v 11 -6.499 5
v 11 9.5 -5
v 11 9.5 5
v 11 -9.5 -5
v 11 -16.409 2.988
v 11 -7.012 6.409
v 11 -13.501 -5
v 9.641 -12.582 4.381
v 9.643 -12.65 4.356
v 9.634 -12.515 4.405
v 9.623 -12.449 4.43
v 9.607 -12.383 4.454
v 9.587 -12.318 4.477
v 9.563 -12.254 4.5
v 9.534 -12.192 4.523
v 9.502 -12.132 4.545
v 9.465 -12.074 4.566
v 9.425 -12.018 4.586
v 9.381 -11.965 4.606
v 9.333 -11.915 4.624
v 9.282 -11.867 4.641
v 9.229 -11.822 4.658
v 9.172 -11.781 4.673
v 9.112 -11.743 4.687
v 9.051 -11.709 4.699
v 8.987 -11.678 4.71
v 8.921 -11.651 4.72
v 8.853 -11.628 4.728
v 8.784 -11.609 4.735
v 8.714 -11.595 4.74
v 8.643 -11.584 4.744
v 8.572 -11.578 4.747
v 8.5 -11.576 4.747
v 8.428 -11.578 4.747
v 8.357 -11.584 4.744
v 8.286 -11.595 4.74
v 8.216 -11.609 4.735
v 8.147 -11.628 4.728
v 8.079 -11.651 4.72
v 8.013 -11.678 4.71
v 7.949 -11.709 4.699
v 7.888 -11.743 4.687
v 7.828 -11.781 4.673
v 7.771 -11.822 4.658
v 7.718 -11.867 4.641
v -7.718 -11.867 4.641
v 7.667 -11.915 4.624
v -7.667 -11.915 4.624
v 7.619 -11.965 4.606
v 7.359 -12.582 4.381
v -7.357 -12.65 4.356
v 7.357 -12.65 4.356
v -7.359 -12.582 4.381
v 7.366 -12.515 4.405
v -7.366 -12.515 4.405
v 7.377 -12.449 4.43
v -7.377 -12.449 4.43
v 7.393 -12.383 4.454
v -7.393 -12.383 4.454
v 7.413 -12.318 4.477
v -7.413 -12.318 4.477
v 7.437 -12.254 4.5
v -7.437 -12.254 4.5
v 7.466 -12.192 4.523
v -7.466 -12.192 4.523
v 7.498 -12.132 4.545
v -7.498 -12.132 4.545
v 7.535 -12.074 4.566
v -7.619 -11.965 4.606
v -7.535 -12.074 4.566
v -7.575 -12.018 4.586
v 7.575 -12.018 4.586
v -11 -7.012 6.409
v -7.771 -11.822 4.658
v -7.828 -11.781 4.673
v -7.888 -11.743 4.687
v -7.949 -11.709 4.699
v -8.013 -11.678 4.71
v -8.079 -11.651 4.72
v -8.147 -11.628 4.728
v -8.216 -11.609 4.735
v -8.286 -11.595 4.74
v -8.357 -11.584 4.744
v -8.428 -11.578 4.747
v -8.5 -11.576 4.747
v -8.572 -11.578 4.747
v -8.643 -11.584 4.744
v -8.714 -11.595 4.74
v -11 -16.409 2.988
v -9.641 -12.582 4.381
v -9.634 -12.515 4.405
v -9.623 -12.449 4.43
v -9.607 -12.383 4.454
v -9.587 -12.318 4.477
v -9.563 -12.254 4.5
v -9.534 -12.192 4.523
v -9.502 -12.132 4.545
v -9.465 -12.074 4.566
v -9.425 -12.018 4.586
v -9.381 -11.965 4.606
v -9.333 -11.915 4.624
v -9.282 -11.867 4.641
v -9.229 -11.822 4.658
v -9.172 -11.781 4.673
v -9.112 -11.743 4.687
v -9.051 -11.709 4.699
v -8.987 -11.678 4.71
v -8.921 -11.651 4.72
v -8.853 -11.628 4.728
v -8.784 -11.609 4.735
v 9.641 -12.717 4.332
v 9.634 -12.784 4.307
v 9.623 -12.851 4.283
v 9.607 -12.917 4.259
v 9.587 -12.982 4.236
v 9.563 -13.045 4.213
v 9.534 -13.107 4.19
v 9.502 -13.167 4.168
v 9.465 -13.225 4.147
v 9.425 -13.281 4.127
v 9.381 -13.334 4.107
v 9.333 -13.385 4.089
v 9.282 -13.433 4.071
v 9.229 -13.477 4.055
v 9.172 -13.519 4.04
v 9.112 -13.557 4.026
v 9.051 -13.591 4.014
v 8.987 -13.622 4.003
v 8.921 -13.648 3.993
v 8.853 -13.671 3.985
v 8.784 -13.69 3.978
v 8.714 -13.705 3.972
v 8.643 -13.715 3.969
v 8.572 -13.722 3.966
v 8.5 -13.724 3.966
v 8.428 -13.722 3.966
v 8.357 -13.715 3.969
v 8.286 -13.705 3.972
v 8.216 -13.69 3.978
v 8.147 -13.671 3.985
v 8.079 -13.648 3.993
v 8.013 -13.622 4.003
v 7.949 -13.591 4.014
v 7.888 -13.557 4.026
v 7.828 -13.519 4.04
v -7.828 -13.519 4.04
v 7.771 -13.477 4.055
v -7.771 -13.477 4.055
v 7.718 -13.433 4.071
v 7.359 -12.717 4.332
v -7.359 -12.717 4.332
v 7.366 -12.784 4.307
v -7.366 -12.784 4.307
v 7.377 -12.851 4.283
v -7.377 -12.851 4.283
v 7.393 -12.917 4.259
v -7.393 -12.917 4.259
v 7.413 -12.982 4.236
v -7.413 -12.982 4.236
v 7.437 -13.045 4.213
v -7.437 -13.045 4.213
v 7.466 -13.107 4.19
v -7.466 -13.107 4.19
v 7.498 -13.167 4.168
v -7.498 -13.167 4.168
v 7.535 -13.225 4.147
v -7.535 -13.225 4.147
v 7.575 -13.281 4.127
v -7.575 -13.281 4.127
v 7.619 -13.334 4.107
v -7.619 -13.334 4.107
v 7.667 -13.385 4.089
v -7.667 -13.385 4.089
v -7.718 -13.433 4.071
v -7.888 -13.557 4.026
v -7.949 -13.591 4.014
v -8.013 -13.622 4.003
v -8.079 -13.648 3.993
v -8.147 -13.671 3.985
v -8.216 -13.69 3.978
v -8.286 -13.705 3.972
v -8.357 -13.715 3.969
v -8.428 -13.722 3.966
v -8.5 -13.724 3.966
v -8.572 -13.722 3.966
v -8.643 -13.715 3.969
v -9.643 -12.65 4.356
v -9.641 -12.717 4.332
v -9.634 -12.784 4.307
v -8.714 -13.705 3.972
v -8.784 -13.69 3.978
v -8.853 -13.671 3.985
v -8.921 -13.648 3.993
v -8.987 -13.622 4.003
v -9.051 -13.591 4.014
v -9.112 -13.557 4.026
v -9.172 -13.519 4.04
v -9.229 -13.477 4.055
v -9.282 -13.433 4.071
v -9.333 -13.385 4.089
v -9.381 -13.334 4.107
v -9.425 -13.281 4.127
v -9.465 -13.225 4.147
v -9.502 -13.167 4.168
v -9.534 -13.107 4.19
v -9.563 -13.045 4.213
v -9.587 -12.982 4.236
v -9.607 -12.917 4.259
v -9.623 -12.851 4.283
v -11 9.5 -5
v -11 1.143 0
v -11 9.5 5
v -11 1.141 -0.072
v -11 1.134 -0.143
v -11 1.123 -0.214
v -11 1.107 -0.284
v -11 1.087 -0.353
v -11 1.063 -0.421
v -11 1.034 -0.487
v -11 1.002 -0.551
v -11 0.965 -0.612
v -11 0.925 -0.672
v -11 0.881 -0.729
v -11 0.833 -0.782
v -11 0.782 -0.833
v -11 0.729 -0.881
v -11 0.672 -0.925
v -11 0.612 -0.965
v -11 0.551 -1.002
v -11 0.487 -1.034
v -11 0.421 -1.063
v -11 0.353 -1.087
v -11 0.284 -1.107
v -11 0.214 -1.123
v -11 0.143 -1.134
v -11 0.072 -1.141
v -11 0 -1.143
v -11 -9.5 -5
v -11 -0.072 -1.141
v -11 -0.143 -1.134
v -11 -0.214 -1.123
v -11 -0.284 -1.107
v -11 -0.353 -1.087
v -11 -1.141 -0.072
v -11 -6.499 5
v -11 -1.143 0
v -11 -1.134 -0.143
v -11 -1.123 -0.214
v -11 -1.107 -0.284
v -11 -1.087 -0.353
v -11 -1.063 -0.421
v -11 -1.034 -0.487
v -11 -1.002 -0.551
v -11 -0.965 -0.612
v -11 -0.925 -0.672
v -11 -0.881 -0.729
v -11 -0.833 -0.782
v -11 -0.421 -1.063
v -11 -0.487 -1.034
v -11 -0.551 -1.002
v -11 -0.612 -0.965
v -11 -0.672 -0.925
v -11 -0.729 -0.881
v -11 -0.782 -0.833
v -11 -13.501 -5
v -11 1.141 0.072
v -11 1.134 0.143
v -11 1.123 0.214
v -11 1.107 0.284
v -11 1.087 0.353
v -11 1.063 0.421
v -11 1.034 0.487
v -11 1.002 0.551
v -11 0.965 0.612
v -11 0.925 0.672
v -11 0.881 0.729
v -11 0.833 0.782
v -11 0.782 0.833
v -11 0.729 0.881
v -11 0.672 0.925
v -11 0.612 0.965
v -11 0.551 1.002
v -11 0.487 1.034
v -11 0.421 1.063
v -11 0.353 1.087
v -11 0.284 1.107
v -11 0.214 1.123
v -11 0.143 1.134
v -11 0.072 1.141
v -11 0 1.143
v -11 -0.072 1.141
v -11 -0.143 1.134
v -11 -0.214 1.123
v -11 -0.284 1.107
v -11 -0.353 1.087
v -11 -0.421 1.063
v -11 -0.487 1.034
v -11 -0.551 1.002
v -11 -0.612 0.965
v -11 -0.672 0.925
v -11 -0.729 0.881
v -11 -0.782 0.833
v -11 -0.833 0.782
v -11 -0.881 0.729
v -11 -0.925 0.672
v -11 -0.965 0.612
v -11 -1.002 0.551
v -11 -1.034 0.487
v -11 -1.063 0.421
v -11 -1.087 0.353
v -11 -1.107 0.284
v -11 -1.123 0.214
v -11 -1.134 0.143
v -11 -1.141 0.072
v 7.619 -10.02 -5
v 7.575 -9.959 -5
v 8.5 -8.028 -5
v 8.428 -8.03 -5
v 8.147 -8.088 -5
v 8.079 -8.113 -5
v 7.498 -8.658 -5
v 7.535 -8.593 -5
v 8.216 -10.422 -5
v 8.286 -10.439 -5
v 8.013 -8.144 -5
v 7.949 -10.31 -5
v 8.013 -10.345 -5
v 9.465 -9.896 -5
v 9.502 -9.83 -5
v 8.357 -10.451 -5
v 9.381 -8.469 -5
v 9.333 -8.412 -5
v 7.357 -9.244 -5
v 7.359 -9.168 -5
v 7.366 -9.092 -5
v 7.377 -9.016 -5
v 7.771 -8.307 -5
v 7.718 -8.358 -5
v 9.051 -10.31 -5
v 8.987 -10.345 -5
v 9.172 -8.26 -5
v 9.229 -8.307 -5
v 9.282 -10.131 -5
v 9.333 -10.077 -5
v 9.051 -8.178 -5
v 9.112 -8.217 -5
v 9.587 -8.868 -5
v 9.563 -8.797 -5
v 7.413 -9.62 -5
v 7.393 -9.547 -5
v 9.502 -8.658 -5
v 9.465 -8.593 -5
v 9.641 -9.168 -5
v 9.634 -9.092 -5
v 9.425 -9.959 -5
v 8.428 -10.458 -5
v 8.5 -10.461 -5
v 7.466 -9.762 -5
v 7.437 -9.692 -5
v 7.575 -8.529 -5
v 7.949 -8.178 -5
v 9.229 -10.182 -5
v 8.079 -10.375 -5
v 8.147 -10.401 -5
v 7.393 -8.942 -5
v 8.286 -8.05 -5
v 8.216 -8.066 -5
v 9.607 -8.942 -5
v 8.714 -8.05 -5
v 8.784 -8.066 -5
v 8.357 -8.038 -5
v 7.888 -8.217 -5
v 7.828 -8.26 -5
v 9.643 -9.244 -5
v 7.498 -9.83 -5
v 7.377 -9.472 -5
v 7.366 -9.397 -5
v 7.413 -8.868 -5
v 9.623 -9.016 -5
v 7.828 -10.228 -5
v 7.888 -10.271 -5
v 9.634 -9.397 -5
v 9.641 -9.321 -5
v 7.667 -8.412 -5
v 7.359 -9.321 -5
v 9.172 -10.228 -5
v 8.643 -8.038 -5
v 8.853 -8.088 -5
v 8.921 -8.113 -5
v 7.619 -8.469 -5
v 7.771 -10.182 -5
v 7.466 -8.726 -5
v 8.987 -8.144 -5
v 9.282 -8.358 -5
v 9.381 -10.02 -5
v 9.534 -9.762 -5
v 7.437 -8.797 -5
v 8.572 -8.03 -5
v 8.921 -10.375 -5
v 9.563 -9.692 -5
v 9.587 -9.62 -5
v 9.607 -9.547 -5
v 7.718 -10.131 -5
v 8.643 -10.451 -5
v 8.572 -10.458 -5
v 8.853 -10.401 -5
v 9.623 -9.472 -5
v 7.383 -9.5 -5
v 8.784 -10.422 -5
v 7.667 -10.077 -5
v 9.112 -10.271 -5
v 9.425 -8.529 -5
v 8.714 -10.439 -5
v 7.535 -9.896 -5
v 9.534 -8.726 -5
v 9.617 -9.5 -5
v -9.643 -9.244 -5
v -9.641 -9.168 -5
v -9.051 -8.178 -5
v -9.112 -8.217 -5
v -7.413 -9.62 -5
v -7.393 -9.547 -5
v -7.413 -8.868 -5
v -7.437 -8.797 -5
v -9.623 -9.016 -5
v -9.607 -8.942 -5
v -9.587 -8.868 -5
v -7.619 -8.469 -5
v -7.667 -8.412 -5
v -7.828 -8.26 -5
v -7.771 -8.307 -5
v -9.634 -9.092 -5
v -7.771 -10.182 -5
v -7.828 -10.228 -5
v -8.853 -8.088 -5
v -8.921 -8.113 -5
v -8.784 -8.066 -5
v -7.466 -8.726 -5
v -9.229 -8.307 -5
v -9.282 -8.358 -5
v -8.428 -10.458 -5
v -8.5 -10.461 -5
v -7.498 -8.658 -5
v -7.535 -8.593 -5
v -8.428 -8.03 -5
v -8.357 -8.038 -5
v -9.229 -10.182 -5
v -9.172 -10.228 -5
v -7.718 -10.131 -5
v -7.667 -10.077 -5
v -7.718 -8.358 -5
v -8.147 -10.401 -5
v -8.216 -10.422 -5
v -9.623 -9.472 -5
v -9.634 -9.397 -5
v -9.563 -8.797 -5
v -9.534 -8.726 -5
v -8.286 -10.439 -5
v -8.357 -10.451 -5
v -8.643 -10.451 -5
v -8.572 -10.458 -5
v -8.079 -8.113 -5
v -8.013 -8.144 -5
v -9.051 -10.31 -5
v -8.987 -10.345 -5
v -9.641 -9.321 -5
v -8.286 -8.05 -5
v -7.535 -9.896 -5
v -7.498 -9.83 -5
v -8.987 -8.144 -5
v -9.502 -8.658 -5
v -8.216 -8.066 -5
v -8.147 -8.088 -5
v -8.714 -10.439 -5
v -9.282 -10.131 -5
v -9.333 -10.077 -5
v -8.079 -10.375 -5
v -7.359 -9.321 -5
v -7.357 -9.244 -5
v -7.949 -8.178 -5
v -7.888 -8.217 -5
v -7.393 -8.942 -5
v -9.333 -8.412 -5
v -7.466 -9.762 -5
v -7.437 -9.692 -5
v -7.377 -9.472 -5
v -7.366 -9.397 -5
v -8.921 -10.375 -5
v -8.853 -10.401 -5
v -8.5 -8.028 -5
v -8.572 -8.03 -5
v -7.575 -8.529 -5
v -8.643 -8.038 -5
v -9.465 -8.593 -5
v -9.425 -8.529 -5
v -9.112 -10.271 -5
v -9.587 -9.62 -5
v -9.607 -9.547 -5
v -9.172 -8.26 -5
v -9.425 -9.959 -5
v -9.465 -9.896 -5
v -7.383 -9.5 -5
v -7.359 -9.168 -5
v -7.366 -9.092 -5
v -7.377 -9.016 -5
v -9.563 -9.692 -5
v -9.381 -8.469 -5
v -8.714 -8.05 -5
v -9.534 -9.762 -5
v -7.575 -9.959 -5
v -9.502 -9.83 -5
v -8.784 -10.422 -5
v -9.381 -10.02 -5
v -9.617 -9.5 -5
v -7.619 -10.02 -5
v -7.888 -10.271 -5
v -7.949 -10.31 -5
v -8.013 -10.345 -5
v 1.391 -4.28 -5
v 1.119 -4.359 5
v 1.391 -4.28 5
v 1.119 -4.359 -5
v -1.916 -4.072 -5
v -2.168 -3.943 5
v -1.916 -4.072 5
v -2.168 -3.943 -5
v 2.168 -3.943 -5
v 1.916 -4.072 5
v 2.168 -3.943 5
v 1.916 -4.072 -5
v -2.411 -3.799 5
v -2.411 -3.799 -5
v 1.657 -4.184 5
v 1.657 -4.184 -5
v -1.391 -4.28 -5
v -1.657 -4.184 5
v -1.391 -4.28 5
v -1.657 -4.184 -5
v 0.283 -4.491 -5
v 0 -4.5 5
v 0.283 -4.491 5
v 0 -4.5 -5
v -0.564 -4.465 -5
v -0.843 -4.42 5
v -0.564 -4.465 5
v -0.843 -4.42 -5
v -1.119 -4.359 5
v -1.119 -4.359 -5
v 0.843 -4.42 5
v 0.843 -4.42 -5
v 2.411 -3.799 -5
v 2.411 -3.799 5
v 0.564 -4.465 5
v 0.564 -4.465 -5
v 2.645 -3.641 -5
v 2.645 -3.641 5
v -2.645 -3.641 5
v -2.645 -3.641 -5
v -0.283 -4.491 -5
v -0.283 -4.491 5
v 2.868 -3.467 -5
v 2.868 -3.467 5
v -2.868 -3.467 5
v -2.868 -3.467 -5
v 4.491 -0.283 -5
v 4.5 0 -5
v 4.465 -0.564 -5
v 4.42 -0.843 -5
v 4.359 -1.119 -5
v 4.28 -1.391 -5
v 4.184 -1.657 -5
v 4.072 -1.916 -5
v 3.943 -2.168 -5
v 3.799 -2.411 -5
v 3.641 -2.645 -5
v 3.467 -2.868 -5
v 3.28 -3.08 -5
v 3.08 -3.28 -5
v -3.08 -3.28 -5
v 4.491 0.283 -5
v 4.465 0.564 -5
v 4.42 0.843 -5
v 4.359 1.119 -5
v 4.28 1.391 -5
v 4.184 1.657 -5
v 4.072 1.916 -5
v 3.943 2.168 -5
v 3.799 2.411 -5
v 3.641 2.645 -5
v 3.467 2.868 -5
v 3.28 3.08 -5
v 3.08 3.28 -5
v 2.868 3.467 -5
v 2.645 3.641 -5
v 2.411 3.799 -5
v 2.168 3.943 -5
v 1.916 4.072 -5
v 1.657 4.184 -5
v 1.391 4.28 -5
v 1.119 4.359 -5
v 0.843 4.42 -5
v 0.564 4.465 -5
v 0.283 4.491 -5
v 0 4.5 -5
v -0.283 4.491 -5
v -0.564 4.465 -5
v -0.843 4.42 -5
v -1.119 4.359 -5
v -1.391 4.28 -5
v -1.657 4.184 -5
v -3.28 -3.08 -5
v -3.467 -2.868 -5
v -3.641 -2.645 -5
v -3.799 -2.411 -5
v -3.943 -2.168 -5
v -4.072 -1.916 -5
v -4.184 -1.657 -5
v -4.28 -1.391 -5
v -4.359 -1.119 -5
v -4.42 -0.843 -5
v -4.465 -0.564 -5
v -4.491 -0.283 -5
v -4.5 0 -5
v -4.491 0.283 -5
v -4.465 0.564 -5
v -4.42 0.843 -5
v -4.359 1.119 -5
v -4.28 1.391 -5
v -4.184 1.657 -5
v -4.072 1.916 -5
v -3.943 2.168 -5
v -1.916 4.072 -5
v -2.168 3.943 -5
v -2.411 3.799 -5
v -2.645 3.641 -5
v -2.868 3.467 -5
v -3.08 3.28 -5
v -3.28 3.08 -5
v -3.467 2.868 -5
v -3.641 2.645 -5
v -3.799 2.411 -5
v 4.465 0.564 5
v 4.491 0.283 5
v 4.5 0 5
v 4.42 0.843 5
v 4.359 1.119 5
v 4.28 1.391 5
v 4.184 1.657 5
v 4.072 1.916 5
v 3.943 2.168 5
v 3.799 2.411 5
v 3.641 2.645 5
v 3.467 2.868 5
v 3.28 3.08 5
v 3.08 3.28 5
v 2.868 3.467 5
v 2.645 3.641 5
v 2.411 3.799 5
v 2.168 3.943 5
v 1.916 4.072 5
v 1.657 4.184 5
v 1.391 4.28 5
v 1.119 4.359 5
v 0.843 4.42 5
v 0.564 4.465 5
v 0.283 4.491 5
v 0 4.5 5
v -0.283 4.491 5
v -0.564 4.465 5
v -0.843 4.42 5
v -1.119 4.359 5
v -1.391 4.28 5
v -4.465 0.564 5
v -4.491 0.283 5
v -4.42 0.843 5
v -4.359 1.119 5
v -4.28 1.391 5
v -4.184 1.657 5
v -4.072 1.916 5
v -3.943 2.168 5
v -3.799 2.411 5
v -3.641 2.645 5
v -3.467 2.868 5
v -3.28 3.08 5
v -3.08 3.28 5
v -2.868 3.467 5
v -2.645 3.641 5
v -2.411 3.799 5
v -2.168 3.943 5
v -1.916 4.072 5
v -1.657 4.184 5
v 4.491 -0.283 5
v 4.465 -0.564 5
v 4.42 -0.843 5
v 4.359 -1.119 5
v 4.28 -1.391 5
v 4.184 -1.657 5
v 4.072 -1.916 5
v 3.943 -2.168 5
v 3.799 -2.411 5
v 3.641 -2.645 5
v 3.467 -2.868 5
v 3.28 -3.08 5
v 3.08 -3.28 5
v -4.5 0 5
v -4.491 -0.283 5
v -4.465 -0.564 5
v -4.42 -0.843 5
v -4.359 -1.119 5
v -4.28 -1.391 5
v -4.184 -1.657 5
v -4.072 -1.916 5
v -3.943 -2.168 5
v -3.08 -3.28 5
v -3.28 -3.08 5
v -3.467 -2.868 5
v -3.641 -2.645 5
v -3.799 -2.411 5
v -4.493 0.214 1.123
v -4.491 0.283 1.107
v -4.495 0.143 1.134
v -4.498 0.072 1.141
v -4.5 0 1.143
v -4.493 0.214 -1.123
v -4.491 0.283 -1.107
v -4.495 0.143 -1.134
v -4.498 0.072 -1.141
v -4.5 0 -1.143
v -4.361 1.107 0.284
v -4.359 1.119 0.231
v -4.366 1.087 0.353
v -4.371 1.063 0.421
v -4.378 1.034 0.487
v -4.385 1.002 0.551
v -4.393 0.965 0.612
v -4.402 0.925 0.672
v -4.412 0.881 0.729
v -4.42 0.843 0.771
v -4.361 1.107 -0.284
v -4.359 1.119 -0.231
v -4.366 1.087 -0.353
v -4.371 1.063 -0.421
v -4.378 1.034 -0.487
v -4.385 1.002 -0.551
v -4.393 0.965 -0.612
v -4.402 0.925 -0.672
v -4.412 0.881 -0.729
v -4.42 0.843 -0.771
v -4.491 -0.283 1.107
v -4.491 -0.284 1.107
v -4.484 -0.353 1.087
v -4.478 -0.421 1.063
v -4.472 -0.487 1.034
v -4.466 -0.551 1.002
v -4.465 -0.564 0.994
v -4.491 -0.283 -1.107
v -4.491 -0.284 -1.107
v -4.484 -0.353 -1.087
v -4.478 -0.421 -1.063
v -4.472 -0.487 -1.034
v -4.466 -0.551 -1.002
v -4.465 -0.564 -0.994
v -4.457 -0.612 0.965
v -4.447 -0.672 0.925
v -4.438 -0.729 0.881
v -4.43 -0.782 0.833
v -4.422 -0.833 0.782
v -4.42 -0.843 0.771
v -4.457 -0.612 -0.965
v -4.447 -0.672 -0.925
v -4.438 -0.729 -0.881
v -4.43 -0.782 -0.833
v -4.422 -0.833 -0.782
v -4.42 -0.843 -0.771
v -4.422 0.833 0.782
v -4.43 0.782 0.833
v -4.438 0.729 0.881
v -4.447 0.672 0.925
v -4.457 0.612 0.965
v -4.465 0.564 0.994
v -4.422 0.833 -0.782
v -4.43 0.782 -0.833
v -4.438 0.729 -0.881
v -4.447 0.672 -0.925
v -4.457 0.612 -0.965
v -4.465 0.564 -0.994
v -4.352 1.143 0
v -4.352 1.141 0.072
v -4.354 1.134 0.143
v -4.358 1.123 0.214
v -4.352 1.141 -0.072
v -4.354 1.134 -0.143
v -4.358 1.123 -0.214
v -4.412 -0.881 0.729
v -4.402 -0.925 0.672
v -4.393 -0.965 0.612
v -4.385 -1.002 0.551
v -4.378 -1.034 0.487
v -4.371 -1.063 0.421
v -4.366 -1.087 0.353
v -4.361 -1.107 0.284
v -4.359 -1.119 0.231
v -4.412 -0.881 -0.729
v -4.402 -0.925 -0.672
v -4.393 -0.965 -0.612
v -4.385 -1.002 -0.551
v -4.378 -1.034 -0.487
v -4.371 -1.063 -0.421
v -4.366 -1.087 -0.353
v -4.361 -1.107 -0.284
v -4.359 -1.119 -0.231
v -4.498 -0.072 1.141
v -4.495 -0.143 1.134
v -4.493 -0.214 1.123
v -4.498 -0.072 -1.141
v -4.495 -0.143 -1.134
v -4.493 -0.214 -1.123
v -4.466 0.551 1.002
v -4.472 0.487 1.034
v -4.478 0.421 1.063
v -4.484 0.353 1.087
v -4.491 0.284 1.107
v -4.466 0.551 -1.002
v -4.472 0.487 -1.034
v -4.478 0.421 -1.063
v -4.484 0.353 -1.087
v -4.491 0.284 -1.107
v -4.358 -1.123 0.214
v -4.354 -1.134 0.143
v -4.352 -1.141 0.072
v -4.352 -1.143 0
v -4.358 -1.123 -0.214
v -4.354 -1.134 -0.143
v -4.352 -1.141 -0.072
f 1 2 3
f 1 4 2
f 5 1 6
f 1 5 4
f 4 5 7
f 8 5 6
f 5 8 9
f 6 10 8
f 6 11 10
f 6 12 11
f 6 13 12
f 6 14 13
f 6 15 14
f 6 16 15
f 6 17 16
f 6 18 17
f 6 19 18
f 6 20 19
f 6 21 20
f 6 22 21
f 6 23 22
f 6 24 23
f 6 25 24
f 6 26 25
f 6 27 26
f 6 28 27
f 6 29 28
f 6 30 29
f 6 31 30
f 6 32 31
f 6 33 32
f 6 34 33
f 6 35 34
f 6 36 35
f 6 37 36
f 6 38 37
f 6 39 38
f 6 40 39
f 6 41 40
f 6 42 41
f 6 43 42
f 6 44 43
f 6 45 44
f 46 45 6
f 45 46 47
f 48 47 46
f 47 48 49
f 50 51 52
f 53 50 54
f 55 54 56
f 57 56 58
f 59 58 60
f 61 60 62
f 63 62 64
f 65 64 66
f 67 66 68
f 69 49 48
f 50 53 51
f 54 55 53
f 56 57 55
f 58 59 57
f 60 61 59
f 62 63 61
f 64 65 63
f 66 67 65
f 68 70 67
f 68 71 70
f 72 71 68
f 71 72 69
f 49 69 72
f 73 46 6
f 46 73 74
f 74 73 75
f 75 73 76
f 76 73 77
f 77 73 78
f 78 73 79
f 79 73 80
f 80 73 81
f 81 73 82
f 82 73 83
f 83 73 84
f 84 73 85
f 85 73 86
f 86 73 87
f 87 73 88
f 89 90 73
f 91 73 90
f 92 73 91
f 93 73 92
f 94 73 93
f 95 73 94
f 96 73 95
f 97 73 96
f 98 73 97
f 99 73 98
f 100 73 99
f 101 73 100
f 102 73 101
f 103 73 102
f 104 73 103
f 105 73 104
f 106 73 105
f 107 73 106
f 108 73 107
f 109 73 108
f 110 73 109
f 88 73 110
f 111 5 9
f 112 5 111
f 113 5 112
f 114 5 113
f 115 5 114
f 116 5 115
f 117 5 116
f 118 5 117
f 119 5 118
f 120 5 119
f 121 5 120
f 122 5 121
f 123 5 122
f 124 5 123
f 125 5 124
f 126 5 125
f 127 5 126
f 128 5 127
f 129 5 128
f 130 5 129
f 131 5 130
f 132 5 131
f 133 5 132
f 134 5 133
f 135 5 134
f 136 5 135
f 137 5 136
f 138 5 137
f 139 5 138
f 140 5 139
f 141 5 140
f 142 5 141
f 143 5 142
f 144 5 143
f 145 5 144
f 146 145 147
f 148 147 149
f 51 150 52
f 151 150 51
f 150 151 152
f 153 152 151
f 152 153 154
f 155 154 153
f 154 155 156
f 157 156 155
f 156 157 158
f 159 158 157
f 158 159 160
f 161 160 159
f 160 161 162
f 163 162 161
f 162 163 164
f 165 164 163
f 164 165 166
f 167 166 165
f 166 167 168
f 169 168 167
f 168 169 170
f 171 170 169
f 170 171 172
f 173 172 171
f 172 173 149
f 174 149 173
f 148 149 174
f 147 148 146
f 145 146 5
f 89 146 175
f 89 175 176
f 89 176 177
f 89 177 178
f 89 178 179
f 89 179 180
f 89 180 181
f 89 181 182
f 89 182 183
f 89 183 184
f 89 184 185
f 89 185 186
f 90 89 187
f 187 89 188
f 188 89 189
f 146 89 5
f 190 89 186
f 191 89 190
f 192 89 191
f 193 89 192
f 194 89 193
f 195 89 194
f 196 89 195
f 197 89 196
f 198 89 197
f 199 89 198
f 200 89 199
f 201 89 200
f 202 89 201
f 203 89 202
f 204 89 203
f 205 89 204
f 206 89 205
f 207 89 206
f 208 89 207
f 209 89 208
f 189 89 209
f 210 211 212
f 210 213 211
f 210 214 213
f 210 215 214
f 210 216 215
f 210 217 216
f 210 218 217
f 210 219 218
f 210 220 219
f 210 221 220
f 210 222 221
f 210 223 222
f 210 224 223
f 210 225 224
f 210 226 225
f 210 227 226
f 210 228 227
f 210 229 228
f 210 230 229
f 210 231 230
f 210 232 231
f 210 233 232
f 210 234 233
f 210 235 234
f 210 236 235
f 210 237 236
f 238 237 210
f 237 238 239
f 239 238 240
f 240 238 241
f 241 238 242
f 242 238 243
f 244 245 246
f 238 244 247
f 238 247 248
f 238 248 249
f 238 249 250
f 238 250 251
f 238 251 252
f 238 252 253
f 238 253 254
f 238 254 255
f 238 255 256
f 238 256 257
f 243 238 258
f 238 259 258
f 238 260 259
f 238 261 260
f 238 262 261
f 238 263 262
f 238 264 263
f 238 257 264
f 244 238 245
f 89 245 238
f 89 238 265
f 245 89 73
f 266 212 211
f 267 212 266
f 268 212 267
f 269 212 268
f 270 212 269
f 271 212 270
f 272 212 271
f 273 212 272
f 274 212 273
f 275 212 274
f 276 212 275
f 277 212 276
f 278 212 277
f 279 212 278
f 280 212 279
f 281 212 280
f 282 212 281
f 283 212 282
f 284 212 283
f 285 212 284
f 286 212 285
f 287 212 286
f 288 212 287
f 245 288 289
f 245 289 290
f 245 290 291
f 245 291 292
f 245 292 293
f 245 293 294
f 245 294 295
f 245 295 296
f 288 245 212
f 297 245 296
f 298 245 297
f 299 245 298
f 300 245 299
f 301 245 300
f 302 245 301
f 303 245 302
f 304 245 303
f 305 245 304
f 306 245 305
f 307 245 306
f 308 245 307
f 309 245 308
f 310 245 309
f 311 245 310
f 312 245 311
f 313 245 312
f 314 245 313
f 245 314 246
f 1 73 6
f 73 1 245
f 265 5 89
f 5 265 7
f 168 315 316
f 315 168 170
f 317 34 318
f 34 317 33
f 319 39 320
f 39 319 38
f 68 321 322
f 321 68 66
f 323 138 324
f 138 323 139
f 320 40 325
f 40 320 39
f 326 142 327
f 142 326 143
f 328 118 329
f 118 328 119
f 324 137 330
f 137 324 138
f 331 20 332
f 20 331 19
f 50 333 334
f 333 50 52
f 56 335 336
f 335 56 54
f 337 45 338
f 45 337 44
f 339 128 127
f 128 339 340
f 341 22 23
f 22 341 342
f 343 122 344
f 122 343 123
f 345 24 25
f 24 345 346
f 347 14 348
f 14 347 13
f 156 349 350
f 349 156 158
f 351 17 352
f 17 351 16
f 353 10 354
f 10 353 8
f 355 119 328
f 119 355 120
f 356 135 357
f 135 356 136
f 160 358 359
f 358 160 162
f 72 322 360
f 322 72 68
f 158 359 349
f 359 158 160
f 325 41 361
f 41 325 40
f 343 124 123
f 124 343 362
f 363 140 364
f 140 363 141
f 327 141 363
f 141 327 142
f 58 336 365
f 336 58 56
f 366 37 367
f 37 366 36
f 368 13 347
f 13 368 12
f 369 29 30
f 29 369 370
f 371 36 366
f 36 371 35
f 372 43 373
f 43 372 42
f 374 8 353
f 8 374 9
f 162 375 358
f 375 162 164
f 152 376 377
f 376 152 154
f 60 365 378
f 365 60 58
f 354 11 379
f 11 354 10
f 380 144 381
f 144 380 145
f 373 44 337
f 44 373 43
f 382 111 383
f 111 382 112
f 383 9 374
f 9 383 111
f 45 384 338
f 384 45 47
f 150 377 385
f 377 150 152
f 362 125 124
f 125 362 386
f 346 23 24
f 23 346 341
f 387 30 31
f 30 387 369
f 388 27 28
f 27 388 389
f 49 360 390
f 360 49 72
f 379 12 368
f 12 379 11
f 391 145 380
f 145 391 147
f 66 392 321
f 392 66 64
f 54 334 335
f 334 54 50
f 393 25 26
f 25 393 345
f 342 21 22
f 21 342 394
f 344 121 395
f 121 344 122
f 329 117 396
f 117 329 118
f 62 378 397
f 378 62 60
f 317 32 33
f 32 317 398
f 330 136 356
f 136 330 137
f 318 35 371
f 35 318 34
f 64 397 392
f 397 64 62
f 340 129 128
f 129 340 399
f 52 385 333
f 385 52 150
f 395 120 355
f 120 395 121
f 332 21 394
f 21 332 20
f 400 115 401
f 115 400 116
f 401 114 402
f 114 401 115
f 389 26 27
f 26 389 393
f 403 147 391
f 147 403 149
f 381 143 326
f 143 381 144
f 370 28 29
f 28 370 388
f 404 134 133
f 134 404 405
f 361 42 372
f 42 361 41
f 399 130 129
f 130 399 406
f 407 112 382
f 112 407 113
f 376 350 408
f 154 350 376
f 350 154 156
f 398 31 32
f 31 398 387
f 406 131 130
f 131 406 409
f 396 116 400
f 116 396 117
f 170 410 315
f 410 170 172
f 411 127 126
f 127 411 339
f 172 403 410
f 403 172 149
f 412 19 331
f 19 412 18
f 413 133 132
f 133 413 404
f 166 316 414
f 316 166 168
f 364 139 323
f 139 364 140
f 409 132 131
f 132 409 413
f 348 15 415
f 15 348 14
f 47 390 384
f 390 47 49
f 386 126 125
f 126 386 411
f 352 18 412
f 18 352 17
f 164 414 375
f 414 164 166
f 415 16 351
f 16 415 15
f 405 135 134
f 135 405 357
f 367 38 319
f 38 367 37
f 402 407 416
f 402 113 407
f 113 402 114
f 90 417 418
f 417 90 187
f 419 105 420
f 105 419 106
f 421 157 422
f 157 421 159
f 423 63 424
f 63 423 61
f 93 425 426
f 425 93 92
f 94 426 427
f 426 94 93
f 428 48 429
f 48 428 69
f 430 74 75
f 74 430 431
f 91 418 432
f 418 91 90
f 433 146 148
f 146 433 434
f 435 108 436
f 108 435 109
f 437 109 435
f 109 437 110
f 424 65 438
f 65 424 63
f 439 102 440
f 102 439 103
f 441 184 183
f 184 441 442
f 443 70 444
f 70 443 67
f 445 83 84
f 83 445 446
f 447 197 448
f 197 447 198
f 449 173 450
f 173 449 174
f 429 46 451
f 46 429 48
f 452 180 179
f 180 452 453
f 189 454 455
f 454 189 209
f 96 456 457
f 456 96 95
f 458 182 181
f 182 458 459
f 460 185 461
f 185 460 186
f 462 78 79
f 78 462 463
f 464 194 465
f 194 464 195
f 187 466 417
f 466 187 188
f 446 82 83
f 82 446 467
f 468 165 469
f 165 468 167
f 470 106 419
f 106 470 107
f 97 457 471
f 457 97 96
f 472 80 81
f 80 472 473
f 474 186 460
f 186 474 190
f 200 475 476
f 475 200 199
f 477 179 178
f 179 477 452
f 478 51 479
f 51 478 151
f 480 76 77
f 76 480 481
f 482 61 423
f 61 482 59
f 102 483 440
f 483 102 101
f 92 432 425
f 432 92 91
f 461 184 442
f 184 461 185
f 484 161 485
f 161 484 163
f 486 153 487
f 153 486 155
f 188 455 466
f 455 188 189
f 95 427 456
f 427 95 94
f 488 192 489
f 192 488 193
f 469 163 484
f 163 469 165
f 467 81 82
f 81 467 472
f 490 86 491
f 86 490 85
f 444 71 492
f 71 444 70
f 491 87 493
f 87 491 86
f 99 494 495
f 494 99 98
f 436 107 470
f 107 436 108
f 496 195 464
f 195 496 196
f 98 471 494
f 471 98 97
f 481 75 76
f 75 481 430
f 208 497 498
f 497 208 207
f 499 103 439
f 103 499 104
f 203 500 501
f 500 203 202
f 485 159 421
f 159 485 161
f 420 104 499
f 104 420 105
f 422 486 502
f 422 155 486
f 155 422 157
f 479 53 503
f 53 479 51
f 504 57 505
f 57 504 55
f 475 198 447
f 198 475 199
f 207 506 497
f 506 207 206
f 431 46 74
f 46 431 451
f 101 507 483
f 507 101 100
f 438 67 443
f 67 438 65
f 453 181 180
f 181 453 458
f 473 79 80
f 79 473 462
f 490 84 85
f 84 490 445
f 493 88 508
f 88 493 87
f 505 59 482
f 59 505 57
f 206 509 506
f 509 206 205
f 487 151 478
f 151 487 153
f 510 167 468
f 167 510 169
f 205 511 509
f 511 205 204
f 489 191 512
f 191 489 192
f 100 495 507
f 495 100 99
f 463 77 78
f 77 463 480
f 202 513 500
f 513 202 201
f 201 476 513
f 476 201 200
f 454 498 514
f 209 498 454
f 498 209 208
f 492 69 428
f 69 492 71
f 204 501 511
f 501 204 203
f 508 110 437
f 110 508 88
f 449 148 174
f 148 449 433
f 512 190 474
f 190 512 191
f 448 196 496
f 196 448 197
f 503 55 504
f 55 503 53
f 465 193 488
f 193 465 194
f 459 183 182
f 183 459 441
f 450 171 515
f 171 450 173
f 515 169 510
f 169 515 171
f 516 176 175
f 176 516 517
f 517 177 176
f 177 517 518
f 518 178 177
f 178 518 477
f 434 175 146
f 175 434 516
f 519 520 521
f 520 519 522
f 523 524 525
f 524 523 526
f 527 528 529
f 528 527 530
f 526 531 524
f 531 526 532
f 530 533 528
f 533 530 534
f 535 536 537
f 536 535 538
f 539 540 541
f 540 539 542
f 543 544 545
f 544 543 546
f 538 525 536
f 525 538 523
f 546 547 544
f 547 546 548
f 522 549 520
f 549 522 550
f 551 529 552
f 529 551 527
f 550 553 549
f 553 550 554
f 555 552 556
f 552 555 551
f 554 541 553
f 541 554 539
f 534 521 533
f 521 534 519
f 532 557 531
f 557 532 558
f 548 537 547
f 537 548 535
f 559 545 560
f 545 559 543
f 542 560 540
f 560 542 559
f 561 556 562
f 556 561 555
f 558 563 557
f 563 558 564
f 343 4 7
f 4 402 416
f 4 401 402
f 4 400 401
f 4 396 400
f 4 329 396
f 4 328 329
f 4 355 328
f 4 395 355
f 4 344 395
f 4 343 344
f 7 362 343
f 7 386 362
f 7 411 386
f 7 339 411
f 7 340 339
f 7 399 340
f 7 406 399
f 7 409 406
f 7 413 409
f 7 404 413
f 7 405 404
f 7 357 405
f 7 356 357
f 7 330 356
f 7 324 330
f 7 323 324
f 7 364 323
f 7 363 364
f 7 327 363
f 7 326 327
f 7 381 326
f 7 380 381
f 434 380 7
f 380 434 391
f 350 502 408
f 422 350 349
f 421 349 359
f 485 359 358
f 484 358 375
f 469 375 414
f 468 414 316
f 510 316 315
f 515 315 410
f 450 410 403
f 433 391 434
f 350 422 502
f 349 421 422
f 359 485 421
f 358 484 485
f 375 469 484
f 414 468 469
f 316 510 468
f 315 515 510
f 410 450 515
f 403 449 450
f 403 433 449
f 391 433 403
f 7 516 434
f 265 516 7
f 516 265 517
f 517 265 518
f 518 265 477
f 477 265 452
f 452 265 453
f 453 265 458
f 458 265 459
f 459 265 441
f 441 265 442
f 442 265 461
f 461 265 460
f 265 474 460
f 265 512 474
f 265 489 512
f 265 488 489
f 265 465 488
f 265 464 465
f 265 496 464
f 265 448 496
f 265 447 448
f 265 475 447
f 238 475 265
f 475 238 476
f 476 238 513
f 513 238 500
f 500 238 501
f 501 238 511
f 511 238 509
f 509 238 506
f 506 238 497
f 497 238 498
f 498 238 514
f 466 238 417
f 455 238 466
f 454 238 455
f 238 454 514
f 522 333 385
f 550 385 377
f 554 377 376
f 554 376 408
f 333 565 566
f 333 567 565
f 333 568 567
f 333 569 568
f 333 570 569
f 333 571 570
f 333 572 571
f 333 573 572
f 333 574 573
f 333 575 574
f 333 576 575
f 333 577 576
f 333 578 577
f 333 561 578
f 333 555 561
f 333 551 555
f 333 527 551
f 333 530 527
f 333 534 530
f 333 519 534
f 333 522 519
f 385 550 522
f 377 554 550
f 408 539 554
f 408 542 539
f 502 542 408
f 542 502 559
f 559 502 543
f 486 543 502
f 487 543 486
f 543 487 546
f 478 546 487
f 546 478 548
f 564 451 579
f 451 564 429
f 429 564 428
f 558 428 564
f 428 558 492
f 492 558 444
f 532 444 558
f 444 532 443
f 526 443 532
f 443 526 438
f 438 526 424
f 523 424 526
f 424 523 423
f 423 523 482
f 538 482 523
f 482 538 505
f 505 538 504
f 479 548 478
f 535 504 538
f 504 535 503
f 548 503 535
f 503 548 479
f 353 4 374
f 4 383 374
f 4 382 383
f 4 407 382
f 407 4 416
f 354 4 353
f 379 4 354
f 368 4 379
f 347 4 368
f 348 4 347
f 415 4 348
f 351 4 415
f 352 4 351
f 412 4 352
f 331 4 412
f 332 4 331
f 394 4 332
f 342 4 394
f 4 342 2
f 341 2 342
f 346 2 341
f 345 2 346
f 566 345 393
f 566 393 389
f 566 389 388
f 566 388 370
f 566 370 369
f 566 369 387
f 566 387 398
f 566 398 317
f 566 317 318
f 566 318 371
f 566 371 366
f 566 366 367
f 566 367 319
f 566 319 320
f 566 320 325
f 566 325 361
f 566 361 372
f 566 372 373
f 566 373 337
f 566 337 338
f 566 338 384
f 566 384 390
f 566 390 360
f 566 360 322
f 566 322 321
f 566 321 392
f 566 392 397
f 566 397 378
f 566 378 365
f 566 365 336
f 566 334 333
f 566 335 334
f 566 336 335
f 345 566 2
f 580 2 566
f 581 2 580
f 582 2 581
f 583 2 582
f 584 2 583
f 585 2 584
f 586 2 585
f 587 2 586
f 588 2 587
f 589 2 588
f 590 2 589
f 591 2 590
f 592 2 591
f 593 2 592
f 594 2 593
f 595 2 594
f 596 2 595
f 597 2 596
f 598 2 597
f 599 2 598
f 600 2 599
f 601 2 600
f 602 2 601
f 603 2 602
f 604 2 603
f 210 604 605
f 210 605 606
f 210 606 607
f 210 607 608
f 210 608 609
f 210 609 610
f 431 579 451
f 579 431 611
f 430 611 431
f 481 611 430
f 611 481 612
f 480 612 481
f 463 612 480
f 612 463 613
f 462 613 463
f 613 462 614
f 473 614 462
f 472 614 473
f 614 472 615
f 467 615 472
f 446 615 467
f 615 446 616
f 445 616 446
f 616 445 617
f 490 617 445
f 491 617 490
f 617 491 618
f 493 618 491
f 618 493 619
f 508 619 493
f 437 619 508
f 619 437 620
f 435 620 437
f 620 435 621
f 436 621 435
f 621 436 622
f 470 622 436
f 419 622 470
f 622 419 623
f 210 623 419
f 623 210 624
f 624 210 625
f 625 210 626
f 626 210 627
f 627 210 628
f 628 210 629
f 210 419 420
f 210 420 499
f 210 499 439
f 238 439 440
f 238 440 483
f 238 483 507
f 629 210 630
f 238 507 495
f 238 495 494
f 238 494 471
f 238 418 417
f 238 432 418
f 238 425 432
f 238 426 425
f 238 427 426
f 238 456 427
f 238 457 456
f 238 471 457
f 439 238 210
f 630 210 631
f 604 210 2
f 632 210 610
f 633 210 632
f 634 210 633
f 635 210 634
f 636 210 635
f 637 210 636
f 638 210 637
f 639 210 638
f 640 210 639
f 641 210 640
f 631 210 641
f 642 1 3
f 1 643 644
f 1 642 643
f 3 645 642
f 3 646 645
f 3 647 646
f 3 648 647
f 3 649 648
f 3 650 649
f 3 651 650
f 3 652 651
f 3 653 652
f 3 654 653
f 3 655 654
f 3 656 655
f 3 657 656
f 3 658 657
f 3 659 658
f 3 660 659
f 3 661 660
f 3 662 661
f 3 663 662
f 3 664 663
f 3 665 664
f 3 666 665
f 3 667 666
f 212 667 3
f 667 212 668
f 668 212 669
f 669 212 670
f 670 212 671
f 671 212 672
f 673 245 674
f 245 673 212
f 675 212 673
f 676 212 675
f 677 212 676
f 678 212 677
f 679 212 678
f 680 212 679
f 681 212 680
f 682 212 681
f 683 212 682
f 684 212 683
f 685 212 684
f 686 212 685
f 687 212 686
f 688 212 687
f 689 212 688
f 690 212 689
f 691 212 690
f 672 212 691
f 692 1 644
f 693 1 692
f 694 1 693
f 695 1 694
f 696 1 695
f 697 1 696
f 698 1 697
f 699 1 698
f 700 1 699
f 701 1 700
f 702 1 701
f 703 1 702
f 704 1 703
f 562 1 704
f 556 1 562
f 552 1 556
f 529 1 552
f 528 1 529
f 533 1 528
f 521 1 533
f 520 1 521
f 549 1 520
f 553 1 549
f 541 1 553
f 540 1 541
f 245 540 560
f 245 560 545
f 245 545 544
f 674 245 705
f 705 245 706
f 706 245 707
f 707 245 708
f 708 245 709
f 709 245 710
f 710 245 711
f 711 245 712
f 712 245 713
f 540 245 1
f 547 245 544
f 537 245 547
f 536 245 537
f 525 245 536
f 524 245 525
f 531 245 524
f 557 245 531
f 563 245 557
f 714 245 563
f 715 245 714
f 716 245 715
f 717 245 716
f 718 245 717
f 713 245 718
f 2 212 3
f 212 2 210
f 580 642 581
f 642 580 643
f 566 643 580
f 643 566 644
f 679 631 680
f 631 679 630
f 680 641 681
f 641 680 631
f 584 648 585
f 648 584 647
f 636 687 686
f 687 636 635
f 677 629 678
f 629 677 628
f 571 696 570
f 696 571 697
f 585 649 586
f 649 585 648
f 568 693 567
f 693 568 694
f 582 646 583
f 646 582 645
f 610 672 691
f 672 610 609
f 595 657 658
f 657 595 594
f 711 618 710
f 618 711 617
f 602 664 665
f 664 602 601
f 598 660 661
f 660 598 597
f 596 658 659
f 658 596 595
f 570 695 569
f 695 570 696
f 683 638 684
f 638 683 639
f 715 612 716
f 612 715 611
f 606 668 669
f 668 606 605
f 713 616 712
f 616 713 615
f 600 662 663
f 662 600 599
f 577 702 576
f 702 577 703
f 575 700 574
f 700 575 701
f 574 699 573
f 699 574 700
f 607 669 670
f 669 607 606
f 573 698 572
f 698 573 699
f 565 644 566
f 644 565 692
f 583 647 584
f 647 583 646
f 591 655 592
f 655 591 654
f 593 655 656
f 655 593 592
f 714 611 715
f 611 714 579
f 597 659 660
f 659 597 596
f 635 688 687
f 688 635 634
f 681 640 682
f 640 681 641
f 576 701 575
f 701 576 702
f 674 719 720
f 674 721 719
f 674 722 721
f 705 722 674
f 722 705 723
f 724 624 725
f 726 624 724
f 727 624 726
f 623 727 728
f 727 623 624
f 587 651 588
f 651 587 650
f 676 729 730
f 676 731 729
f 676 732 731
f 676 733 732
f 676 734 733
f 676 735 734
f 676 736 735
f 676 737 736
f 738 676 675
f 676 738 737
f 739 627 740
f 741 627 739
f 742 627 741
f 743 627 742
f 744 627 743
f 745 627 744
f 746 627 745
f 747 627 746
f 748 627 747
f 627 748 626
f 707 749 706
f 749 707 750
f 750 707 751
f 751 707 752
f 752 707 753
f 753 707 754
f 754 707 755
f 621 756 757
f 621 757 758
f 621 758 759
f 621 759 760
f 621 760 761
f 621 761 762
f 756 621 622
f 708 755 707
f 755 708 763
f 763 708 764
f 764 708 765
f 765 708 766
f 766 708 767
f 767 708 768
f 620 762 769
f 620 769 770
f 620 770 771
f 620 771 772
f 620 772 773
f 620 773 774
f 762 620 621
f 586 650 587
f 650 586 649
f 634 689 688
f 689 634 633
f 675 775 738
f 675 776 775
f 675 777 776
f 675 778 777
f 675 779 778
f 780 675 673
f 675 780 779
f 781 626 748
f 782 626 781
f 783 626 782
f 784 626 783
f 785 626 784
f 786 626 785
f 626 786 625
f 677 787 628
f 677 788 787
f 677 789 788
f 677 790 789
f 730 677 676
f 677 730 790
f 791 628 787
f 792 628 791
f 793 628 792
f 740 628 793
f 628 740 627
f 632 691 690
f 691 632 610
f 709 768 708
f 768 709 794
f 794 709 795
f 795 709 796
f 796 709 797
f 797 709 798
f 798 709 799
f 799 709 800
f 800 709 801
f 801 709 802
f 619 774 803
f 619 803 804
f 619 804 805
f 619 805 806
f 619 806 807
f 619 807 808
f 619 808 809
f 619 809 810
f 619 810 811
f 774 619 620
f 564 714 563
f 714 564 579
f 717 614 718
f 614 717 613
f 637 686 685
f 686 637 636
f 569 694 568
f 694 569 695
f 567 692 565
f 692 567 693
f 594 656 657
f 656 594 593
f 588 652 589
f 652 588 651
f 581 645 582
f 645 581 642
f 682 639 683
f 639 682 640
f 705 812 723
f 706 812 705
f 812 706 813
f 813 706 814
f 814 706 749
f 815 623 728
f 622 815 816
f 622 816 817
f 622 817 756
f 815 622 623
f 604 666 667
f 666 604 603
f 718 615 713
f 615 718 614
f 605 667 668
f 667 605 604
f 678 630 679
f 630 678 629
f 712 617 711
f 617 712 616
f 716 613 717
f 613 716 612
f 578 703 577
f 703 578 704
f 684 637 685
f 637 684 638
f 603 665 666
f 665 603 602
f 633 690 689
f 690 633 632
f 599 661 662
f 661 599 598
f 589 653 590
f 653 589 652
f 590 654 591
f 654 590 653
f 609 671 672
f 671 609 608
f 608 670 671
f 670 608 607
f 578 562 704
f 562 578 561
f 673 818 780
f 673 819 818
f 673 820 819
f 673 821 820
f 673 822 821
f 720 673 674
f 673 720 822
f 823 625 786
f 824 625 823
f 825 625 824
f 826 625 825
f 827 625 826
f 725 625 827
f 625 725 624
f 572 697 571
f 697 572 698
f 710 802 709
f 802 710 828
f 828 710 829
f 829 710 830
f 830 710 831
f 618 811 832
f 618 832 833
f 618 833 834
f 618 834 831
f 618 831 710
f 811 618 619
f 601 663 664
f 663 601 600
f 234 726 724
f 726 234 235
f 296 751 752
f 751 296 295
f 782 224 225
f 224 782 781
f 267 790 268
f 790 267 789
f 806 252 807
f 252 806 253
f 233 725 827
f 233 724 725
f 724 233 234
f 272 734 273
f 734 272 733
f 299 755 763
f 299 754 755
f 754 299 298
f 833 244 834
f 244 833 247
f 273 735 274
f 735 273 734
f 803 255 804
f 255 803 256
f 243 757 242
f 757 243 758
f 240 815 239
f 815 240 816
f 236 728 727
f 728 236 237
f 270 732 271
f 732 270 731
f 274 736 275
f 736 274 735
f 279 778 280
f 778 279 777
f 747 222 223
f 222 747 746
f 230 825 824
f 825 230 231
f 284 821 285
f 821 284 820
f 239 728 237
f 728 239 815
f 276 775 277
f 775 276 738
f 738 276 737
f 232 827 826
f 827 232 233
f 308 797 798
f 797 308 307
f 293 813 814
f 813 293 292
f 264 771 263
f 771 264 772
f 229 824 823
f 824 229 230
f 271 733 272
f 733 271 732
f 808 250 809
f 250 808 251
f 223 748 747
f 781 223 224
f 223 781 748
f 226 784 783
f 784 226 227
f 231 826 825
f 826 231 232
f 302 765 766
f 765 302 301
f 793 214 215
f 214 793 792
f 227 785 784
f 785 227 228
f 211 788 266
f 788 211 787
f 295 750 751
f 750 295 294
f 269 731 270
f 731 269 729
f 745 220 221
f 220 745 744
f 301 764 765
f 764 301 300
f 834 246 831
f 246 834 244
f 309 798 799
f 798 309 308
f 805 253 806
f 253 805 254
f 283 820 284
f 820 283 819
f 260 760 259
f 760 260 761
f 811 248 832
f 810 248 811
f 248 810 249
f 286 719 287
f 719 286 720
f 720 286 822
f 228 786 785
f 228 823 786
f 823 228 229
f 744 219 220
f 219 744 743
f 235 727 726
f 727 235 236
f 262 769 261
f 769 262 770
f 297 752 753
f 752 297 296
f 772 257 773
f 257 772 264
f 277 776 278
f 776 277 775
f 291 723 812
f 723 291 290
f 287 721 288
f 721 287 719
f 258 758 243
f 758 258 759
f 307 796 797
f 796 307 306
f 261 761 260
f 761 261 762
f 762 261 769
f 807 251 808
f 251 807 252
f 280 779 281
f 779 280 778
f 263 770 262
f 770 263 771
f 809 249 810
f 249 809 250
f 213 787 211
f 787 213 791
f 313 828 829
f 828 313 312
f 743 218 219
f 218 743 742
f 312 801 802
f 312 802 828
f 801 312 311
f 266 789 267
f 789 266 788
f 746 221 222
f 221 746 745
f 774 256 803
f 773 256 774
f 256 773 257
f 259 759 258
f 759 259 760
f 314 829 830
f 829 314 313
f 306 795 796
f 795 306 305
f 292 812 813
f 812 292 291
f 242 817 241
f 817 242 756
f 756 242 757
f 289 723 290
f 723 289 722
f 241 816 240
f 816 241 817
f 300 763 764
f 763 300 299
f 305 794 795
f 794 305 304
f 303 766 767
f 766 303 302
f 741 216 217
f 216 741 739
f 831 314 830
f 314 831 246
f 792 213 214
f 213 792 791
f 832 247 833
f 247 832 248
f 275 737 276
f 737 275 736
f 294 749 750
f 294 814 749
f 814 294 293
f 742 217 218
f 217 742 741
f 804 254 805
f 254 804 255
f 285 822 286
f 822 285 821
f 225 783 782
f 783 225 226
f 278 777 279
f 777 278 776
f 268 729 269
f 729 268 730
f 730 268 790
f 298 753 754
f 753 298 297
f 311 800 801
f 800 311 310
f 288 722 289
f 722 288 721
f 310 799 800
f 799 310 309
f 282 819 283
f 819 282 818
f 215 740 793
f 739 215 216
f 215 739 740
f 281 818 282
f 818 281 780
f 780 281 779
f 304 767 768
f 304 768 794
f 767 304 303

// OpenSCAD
// file: tubing.scad
res = 10;
module tubing(radius, length)
{
    cylinder(r = radius, h = length, center = true, $fn=res);  
}

module sleeve(length, tube_ir, thickness)
{
  difference()
  {
    cylinder(r = (tube_ir + thickness), h = length, center = true,$fn=res );
    tubing(tube_ir,length+4);
  }
}

module cap(radius)
{
  difference()
  {
    sphere(r = radius);
    translate([0,0,-radius])
    cube(size = 2*radius,center=true);
  }
}
  
module capped01()
{


 
  tube_od = 7.9;
 	tube_or = tube_od / 2.0;
  tube_length = 10;
  union()
  {
    sleeve(tube_length,tube_or, 1.0);
    translate([0,0,tube_length/2.])
    cap(tube_or + 1.1);
  }
}

module connector01(tube_length)
{
  tube_od = 7.9;
 	tube_or = tube_od / 2.0;

  union()
  {
    translate([10,0,0])
      sleeve(tube_length ,tube_or,1.0);
    translate([-10,0,0])
      sleeve(tube_length ,tube_or,1.0);
    cube([tube_length  - tube_od,5,tube_length],center = true);
  }

}

module connector02(tube_length )
{
  tube_od = 7.9;
 	tube_or = tube_od / 2.0;
  module shape01()
  {
    difference()
    {
      sleeve(tube_length ,tube_or,1.0);
      translate([0,tube_length/2,tube_length/2. - tube_or * 1.5  ])
      rotate([90,0,0])
      tubing(tube_or,tube_length+1);
    }
  }
  
  module shape02(tube_length )
  {
    difference()
    {
      sleeve(tube_length ,tube_or,1.0);
      translate([0,0,tube_length/2. ])
      rotate([90,0,0])
      tubing(tube_or,tube_length+1);
    }
  }
  union()
  {
  shape01();
  
  #translate([0,tube_length/2,tube_length/2. - tube_or * 1.5  ])
  rotate([90,180,0])
      shape02(tube_length);
  }
}

//capped01();
/*
translate([0,-10,0])
  connector01(20);
translate([0,10,0])
  connector01(20);
  */
  module tube_joint()
  {
  tube_od = 7.85;
 	tube_or = tube_od / 2.0;
 	
  //translate([0,-30,0])
  //connector01(20);
  rotate([0,-90,0])
  difference()
  {
  rotate([0,90,0])
  cylinder(r=10,h=40,center = true,$fn=res);
  //cube([35,20,20],center = true);
  translate([-10,0,0])
  tubing(tube_or,30);
    translate([10,0,0])
  tubing(tube_or,30);
  rotate([90,0,0])
      translate([10,0,0])
  tubing(tube_or,30);
    rotate([90,0,0])
      translate([-10,0,0])
  tubing(tube_or,30);
      rotate([0,90,0])
      //translate([-10,0,0])
  tubing(tube_or,50);
  }
  }
// main file
include <tubing.scad>

tube_od = 9.0;
tube_or = tube_od / 2.0;
spacing = tube_od + 20;
res = 100;
$fn=100;

width = tube_od + 8;
depth = tube_od + 8;

module block_sleeve(width,depth,height)
{
  difference()
  {
    cube([width,depth,height],center=true);
    
  }
}
module laser_hole(width,depth,height)
{
  tubing(tube_or, height + 2);
}

module set_hole(length, axis)
{
 rotate(90,axis)
 cylinder(r = 2.286/2, h = length, center = true, $fn=100 );
}


module set_holes()
{
  translate([-width/2,depth/2 - tube_or -4,0])
  set_hole(10, [0,1,0]);
}

module laser_block()
{

difference()
{
    block_sleeve(22, depth+2, 10);
    laser_hole(width,depth,10);
    set_holes();
}
}

union()
{

difference()
{
translate([0,-10,0])
rotate(20,[1,0,0])
difference(){
	block_sleeve(22,10,10);
 	translate([8.5,-1,2])
	rotate(90,[0,1,0])  	
	set_hole(20, [0,1,0]);
 	translate([-8.5,-1,2])
	rotate(90,[0,1,0])  	
	set_hole(20, [0,1,0]);
}
laser_hole(width,depth,10);
translate([0,0,-10.0])
block_sleeve(50,100, 10);
}
difference()
{
laser_block();
translate([0,-10,0])
rotate(20,[1,0,0])
union()
{
	translate([8.5,-1,2])
	rotate(90,[0,1,0])  	
	set_hole(20, [0,1,0]);
 	translate([-8.5,-1,2])
	rotate(90,[0,1,0])  	
	set_hole(20, [0,1,0]);
}
}
}
